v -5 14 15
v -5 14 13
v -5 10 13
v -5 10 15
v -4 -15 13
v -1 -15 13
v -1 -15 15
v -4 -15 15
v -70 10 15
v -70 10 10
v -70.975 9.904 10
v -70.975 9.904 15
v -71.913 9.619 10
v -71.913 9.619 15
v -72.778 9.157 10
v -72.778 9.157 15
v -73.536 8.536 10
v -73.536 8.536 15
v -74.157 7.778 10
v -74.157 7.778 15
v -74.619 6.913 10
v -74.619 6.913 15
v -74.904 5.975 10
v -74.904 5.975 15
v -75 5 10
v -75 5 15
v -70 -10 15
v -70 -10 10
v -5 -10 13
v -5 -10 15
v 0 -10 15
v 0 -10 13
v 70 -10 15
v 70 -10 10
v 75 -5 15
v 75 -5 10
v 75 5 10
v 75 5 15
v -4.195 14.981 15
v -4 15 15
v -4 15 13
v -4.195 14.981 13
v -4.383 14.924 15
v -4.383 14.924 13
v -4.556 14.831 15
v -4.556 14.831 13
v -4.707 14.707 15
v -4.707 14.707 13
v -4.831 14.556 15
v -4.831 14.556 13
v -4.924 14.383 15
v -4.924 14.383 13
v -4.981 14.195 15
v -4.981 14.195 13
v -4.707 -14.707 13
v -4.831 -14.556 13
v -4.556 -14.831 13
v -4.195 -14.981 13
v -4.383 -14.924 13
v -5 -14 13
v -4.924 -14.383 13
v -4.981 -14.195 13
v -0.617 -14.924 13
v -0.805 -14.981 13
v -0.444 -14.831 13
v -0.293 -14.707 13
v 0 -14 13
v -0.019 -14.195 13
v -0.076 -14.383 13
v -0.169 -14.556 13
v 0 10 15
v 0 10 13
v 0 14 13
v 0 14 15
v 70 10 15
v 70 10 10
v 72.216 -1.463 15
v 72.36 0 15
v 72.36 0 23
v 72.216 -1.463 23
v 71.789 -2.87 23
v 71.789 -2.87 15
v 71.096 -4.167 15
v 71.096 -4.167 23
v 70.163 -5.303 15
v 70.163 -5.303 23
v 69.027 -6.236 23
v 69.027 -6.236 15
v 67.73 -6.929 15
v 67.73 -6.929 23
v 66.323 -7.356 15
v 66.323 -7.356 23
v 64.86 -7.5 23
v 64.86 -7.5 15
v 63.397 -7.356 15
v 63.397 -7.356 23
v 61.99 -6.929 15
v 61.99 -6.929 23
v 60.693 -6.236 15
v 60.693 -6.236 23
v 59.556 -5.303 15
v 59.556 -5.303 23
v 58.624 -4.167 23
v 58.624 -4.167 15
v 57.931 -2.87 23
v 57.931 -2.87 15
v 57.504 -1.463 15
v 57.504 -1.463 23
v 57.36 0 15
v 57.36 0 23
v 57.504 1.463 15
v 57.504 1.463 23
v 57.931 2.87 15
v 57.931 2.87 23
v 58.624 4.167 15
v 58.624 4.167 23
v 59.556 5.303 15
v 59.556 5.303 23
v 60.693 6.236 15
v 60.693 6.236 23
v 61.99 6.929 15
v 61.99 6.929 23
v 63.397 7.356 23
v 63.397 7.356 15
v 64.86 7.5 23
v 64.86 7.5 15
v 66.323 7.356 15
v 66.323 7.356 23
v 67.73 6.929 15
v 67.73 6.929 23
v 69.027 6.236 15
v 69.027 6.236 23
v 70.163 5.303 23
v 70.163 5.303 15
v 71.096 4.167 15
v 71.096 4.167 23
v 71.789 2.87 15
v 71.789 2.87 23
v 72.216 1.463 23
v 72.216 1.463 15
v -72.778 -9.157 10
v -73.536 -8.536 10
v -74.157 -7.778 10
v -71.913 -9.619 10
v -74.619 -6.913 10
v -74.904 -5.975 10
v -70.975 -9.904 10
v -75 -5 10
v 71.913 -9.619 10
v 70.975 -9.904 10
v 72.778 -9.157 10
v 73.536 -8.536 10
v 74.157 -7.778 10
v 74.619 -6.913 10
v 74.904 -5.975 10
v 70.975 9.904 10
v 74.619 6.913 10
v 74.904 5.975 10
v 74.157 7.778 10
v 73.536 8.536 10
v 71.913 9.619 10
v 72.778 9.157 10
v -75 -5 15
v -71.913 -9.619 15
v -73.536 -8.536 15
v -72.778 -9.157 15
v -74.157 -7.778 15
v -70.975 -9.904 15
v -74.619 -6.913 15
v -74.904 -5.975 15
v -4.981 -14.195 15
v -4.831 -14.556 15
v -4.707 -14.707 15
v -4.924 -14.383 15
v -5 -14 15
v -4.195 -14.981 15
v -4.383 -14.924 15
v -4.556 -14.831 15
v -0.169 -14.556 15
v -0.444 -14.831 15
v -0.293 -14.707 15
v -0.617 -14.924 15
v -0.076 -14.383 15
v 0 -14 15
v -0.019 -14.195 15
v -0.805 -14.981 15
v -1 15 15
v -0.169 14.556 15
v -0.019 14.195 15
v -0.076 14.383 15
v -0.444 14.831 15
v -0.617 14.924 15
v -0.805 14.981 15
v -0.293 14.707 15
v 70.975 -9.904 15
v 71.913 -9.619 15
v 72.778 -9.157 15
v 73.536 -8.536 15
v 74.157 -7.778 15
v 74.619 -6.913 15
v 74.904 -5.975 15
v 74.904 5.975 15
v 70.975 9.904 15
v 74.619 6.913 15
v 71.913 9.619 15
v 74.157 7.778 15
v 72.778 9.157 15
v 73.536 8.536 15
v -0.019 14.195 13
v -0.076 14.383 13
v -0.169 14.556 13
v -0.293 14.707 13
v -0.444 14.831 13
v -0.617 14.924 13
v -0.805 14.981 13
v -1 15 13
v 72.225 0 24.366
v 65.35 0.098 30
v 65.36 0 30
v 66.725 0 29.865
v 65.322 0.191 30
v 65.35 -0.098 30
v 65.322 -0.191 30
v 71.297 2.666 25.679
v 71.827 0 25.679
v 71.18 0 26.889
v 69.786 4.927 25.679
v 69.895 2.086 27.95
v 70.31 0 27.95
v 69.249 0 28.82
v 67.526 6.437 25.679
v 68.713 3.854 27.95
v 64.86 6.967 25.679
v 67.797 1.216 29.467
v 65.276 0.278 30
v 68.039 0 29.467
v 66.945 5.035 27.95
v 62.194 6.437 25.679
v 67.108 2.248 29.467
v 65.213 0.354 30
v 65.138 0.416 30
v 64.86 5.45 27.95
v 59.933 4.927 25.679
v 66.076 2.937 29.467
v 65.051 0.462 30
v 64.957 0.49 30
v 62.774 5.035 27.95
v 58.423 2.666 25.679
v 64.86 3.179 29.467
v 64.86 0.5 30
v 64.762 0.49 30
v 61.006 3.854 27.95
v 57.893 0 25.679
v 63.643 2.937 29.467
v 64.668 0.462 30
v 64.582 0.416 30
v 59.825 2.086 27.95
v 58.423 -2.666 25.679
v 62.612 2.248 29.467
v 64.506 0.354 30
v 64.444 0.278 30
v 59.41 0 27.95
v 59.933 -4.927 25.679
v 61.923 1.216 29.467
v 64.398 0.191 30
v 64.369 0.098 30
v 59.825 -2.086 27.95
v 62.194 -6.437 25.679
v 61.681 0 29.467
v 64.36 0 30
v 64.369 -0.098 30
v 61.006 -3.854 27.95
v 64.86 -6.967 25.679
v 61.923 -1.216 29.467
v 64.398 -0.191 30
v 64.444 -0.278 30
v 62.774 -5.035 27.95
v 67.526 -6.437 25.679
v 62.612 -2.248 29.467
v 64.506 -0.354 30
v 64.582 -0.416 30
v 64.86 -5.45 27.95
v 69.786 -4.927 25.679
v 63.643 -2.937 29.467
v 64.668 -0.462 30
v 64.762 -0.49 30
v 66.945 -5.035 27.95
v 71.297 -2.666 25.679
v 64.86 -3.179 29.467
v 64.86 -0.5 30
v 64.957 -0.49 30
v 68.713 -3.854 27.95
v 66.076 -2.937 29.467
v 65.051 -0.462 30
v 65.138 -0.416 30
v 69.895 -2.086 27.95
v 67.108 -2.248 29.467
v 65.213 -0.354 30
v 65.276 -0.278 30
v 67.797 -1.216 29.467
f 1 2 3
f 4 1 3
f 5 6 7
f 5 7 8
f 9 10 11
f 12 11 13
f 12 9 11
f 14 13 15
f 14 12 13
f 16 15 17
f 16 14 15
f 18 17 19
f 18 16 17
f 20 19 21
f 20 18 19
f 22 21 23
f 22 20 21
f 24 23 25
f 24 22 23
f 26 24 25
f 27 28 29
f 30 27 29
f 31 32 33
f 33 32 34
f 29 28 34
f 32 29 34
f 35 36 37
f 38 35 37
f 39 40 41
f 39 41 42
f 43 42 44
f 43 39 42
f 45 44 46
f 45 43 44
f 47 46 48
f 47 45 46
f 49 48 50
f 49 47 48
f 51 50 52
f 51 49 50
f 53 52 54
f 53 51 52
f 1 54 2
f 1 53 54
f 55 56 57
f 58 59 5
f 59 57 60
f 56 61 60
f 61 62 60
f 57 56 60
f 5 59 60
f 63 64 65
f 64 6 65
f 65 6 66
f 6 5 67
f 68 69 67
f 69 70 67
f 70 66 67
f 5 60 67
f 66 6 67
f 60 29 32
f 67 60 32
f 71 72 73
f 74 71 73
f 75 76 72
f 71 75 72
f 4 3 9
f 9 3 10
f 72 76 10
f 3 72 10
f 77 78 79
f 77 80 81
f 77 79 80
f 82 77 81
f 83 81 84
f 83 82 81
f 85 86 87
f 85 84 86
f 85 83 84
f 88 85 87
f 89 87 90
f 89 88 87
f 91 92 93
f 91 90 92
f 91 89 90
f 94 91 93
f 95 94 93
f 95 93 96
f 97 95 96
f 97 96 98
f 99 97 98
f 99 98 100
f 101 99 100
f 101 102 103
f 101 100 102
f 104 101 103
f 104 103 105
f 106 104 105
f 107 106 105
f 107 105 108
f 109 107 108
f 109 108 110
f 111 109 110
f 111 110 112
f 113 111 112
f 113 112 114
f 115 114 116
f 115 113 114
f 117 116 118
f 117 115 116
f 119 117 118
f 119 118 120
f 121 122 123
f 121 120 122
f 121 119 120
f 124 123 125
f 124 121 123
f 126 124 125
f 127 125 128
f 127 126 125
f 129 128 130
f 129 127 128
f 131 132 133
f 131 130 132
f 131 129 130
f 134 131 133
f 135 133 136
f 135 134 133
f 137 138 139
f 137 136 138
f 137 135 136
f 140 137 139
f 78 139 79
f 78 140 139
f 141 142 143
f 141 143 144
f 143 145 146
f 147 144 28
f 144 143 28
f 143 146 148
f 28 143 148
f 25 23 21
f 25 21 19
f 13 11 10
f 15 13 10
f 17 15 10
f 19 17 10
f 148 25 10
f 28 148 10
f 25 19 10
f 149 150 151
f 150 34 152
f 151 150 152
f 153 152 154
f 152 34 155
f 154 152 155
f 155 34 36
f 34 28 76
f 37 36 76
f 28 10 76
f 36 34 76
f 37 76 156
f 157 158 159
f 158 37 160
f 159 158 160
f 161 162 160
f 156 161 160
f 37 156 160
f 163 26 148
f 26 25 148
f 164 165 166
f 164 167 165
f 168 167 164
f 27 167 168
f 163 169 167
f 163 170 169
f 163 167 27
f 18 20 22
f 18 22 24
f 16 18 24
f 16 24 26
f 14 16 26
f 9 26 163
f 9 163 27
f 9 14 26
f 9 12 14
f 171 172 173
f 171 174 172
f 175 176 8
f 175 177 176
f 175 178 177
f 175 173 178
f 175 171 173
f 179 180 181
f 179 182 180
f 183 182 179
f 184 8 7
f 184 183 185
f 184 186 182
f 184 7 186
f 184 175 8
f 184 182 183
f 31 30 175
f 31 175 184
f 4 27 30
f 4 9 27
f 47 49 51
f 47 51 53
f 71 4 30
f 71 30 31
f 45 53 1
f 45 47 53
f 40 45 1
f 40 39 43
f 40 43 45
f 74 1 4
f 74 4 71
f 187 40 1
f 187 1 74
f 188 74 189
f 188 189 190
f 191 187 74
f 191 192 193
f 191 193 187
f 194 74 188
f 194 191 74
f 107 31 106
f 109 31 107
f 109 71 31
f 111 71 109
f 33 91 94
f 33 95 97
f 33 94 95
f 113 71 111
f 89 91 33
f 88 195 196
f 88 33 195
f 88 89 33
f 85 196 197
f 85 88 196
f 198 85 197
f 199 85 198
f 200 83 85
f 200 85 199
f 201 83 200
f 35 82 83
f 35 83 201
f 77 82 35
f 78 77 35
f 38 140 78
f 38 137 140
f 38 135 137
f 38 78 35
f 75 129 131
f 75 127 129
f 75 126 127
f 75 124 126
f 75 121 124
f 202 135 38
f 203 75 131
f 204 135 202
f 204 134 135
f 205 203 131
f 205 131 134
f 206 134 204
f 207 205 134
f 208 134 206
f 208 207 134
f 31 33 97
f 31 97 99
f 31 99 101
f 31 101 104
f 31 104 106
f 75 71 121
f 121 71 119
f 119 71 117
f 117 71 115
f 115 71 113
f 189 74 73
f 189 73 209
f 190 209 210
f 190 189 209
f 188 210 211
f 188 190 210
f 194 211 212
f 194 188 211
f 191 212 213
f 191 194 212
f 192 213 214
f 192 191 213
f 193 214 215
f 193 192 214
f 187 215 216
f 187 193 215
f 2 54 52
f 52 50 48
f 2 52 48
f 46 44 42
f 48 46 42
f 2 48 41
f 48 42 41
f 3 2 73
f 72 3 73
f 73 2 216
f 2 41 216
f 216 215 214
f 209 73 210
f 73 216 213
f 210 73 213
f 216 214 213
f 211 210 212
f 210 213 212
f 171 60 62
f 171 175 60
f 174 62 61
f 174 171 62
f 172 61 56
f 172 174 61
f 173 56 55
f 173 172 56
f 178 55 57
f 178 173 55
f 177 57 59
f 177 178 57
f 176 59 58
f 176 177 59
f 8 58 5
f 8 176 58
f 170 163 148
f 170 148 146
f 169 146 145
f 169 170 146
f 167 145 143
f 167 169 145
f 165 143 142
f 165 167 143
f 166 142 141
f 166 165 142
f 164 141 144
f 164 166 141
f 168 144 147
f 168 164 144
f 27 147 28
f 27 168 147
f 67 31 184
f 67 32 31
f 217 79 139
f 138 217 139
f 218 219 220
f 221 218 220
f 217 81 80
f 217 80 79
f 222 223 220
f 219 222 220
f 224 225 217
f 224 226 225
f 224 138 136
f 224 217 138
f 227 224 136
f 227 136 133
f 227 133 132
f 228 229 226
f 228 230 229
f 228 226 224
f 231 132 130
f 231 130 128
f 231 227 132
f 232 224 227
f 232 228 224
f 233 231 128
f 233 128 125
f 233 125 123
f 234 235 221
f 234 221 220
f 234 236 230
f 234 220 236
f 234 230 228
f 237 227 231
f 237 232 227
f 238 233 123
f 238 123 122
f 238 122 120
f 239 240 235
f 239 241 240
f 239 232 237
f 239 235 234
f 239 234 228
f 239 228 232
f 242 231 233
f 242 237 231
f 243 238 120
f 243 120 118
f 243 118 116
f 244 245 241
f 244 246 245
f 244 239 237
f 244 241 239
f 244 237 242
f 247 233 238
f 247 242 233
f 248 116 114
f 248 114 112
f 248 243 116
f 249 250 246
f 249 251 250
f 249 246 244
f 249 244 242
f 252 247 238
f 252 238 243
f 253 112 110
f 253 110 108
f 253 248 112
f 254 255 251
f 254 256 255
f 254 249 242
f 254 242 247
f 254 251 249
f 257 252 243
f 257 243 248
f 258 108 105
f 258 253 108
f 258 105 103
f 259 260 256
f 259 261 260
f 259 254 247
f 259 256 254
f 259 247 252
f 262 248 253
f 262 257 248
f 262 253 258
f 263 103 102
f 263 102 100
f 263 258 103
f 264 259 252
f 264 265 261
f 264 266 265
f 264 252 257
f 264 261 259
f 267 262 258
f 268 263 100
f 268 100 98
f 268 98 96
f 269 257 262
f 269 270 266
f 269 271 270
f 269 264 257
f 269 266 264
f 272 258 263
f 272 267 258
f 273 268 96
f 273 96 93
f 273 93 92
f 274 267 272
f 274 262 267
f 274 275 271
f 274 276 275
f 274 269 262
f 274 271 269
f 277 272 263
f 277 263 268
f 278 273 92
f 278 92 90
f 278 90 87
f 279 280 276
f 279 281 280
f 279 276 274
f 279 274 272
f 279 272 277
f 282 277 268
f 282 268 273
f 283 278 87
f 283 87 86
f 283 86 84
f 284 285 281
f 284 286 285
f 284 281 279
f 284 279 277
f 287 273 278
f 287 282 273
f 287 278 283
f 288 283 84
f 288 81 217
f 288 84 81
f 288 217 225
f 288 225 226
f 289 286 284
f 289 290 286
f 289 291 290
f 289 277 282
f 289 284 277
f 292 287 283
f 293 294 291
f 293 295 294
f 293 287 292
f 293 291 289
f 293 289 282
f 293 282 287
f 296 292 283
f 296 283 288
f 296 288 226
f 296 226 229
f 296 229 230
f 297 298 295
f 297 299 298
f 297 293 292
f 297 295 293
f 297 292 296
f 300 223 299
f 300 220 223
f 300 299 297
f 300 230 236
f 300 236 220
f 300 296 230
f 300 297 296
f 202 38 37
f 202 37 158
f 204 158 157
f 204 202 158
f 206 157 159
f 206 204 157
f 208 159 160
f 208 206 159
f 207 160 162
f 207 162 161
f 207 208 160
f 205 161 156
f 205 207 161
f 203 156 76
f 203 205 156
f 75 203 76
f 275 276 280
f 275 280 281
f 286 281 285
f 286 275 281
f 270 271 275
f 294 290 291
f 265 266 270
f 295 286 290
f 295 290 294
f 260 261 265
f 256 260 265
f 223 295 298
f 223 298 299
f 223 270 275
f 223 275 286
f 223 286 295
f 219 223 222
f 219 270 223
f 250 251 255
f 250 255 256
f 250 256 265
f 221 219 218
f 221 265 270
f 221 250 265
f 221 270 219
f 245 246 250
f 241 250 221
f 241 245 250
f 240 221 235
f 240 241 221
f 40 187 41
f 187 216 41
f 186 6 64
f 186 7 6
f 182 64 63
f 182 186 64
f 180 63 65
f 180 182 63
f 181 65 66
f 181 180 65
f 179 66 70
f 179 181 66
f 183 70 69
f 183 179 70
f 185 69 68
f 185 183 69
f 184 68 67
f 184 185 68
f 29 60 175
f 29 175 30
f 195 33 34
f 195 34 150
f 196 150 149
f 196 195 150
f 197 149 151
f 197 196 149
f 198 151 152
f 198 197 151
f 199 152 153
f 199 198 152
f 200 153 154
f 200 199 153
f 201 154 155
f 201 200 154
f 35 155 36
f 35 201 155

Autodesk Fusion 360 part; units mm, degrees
sketch "Esquisse1" plane through (0, 0, 0) normal (0, 0, 1) x (1, 0, 0)
  line L0 (75, 10) -> (-75, 10)
  line L1 (-75, 10) -> (-75, -10)
  line L2 (-75, -10) -> (75, -10)
  line L3 (75, -10) -> (75, 10)
  line L4 (75, 10) -> (-75, -10) construction
  line L5 (-75, 10) -> (75, -10) construction
  line L6 (-5, 10) -> (0, 10)
  line L7 (0, 10) -> (0, 15)
  line L8 (0, 15) -> (-5, 15)
  line L9 (-5, 15) -> (-5, 10)
  line L10 (-5, -10) -> (0, -10)
  line L11 (0, -10) -> (0, -15)
  line L12 (0, -15) -> (-5, -15)
  line L13 (-5, -15) -> (-5, -10)
  circle A0 centre (64.8598, 0) radius 7.5
  dimension "d1" = 150
  dimension "d2" = 20
  dimension "d3" = 5
  dimension "d4" = 5
  dimension "d5" = 70
  dimension "d6" = 5
  dimension "d7" = 5
  dimension "d8" = 15
  dimension "d35" = 70
extrude "Extrusion1" add sketch "Esquisse1" along normal blind 15
extrude "Extrusion2" cut sketch "Esquisse1" along normal blind 6 contours L0 L6 L7 L8 L9 | L2 L10 L11 L12 L13
fillet "Congé1" radius 5 4 edges at (-75, 10, 7.5) (-75, -10, 7.5) (75, 10, 7.5) (75, -10, 7.5)
extrude "Extrusion3" cut sketch "Esquisse1" along normal blind 3 contours L0 L1 L2 L3 L6 L10
extrude "Extrusion4" cut 2 faces at (-3.3333, -11.6667, 6) (-1.6667, 11.6667, 6) along direction (0, 0, 1) blind 4
fillet "Congé2" radius 1 4 edges at (-5, -15, 12.5) (0, -15, 12.5) (-5, 15, 12.5) (0, 15, 12.5)
extrude "Extrusion5" add sketch "Esquisse1" along normal blind 30 contours A0
extrude "Extrusion6" cut sketch "Esquisse1" along normal blind 3 contours A0
fillet "Congé3" radius 7 1 edges at (57.8673, -2.7121, 30)
extrude "Extrusion7" cut 1 faces at (23.3333, -3.3333, 3) along direction (0, 0, 1) blind 5
extrude "Extrusion8" cut 1 faces at (23.3333, -3.3333, 8) along direction (0, 0, 1) blind 1
extrude "Extrusion9" cut 2 faces at (-3.3333, -11.3333, 10) (-3.3333, 11.3333, 10) along direction (0, 0, 1) blind 3
extrude "Extrusion10" cut 1 faces at (23.3333, -3.3333, 9) along direction (0, 0, 1) blind 1
